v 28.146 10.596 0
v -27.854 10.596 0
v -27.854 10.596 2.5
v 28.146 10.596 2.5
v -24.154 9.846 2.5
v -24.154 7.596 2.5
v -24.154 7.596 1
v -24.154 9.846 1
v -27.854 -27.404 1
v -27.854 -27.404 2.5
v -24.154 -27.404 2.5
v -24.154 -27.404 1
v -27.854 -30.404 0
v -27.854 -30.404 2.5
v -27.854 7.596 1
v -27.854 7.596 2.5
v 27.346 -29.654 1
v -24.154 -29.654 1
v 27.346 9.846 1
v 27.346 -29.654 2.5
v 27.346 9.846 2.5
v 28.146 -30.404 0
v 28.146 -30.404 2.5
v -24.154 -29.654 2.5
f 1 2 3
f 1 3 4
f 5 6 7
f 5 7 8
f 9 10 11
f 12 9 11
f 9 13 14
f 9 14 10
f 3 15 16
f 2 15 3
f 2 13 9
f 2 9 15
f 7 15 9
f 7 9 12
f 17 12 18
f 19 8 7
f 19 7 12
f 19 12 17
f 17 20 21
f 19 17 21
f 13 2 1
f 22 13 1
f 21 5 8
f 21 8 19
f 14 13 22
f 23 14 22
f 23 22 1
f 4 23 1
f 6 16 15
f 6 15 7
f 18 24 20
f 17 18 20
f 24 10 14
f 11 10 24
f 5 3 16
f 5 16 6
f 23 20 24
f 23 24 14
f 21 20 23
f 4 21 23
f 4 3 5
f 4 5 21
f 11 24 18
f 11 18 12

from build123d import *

# Parameters (mm, degrees)
SKETCH1_W           = 56
SKETCH1_H           = 41
BOSS_EXTRUDE1_DEPTH = 2.5
SKETCH2_W           = 51.5
SKETCH2_H           = 39.5
CUT_EXTRUDE1_DEPTH  = 1.5
SKETCH3_W           = 3.7
SKETCH3_H           = 35
CUT_EXTRUDE2_DEPTH  = 1.5


with BuildPart() as part:
    # Sketch1 → Boss-Extrude1 (new body)
    with BuildSketch(Plane.XY):
        with Locations((0.145813854, -9.904151416)):
            Rectangle(SKETCH1_W, SKETCH1_H)
    extrude(amount=BOSS_EXTRUDE1_DEPTH)

    # Sketch2 → Cut-Extrude1 (cut)
    with BuildSketch(Plane.XY.offset(2.5)):
        with Locations((1.595813854, -9.904151416)):
            Rectangle(SKETCH2_W, SKETCH2_H)
    extrude(amount=-CUT_EXTRUDE1_DEPTH, mode=Mode.SUBTRACT)

    # Sketch3 → Cut-Extrude2 (cut)
    with BuildSketch(Plane.XY.offset(2.5)):
        with Locations((-26.004186146, -9.904151416)):
            Rectangle(SKETCH3_W, SKETCH3_H)
    extrude(amount=-CUT_EXTRUDE2_DEPTH, mode=Mode.SUBTRACT)


solid = part.part
